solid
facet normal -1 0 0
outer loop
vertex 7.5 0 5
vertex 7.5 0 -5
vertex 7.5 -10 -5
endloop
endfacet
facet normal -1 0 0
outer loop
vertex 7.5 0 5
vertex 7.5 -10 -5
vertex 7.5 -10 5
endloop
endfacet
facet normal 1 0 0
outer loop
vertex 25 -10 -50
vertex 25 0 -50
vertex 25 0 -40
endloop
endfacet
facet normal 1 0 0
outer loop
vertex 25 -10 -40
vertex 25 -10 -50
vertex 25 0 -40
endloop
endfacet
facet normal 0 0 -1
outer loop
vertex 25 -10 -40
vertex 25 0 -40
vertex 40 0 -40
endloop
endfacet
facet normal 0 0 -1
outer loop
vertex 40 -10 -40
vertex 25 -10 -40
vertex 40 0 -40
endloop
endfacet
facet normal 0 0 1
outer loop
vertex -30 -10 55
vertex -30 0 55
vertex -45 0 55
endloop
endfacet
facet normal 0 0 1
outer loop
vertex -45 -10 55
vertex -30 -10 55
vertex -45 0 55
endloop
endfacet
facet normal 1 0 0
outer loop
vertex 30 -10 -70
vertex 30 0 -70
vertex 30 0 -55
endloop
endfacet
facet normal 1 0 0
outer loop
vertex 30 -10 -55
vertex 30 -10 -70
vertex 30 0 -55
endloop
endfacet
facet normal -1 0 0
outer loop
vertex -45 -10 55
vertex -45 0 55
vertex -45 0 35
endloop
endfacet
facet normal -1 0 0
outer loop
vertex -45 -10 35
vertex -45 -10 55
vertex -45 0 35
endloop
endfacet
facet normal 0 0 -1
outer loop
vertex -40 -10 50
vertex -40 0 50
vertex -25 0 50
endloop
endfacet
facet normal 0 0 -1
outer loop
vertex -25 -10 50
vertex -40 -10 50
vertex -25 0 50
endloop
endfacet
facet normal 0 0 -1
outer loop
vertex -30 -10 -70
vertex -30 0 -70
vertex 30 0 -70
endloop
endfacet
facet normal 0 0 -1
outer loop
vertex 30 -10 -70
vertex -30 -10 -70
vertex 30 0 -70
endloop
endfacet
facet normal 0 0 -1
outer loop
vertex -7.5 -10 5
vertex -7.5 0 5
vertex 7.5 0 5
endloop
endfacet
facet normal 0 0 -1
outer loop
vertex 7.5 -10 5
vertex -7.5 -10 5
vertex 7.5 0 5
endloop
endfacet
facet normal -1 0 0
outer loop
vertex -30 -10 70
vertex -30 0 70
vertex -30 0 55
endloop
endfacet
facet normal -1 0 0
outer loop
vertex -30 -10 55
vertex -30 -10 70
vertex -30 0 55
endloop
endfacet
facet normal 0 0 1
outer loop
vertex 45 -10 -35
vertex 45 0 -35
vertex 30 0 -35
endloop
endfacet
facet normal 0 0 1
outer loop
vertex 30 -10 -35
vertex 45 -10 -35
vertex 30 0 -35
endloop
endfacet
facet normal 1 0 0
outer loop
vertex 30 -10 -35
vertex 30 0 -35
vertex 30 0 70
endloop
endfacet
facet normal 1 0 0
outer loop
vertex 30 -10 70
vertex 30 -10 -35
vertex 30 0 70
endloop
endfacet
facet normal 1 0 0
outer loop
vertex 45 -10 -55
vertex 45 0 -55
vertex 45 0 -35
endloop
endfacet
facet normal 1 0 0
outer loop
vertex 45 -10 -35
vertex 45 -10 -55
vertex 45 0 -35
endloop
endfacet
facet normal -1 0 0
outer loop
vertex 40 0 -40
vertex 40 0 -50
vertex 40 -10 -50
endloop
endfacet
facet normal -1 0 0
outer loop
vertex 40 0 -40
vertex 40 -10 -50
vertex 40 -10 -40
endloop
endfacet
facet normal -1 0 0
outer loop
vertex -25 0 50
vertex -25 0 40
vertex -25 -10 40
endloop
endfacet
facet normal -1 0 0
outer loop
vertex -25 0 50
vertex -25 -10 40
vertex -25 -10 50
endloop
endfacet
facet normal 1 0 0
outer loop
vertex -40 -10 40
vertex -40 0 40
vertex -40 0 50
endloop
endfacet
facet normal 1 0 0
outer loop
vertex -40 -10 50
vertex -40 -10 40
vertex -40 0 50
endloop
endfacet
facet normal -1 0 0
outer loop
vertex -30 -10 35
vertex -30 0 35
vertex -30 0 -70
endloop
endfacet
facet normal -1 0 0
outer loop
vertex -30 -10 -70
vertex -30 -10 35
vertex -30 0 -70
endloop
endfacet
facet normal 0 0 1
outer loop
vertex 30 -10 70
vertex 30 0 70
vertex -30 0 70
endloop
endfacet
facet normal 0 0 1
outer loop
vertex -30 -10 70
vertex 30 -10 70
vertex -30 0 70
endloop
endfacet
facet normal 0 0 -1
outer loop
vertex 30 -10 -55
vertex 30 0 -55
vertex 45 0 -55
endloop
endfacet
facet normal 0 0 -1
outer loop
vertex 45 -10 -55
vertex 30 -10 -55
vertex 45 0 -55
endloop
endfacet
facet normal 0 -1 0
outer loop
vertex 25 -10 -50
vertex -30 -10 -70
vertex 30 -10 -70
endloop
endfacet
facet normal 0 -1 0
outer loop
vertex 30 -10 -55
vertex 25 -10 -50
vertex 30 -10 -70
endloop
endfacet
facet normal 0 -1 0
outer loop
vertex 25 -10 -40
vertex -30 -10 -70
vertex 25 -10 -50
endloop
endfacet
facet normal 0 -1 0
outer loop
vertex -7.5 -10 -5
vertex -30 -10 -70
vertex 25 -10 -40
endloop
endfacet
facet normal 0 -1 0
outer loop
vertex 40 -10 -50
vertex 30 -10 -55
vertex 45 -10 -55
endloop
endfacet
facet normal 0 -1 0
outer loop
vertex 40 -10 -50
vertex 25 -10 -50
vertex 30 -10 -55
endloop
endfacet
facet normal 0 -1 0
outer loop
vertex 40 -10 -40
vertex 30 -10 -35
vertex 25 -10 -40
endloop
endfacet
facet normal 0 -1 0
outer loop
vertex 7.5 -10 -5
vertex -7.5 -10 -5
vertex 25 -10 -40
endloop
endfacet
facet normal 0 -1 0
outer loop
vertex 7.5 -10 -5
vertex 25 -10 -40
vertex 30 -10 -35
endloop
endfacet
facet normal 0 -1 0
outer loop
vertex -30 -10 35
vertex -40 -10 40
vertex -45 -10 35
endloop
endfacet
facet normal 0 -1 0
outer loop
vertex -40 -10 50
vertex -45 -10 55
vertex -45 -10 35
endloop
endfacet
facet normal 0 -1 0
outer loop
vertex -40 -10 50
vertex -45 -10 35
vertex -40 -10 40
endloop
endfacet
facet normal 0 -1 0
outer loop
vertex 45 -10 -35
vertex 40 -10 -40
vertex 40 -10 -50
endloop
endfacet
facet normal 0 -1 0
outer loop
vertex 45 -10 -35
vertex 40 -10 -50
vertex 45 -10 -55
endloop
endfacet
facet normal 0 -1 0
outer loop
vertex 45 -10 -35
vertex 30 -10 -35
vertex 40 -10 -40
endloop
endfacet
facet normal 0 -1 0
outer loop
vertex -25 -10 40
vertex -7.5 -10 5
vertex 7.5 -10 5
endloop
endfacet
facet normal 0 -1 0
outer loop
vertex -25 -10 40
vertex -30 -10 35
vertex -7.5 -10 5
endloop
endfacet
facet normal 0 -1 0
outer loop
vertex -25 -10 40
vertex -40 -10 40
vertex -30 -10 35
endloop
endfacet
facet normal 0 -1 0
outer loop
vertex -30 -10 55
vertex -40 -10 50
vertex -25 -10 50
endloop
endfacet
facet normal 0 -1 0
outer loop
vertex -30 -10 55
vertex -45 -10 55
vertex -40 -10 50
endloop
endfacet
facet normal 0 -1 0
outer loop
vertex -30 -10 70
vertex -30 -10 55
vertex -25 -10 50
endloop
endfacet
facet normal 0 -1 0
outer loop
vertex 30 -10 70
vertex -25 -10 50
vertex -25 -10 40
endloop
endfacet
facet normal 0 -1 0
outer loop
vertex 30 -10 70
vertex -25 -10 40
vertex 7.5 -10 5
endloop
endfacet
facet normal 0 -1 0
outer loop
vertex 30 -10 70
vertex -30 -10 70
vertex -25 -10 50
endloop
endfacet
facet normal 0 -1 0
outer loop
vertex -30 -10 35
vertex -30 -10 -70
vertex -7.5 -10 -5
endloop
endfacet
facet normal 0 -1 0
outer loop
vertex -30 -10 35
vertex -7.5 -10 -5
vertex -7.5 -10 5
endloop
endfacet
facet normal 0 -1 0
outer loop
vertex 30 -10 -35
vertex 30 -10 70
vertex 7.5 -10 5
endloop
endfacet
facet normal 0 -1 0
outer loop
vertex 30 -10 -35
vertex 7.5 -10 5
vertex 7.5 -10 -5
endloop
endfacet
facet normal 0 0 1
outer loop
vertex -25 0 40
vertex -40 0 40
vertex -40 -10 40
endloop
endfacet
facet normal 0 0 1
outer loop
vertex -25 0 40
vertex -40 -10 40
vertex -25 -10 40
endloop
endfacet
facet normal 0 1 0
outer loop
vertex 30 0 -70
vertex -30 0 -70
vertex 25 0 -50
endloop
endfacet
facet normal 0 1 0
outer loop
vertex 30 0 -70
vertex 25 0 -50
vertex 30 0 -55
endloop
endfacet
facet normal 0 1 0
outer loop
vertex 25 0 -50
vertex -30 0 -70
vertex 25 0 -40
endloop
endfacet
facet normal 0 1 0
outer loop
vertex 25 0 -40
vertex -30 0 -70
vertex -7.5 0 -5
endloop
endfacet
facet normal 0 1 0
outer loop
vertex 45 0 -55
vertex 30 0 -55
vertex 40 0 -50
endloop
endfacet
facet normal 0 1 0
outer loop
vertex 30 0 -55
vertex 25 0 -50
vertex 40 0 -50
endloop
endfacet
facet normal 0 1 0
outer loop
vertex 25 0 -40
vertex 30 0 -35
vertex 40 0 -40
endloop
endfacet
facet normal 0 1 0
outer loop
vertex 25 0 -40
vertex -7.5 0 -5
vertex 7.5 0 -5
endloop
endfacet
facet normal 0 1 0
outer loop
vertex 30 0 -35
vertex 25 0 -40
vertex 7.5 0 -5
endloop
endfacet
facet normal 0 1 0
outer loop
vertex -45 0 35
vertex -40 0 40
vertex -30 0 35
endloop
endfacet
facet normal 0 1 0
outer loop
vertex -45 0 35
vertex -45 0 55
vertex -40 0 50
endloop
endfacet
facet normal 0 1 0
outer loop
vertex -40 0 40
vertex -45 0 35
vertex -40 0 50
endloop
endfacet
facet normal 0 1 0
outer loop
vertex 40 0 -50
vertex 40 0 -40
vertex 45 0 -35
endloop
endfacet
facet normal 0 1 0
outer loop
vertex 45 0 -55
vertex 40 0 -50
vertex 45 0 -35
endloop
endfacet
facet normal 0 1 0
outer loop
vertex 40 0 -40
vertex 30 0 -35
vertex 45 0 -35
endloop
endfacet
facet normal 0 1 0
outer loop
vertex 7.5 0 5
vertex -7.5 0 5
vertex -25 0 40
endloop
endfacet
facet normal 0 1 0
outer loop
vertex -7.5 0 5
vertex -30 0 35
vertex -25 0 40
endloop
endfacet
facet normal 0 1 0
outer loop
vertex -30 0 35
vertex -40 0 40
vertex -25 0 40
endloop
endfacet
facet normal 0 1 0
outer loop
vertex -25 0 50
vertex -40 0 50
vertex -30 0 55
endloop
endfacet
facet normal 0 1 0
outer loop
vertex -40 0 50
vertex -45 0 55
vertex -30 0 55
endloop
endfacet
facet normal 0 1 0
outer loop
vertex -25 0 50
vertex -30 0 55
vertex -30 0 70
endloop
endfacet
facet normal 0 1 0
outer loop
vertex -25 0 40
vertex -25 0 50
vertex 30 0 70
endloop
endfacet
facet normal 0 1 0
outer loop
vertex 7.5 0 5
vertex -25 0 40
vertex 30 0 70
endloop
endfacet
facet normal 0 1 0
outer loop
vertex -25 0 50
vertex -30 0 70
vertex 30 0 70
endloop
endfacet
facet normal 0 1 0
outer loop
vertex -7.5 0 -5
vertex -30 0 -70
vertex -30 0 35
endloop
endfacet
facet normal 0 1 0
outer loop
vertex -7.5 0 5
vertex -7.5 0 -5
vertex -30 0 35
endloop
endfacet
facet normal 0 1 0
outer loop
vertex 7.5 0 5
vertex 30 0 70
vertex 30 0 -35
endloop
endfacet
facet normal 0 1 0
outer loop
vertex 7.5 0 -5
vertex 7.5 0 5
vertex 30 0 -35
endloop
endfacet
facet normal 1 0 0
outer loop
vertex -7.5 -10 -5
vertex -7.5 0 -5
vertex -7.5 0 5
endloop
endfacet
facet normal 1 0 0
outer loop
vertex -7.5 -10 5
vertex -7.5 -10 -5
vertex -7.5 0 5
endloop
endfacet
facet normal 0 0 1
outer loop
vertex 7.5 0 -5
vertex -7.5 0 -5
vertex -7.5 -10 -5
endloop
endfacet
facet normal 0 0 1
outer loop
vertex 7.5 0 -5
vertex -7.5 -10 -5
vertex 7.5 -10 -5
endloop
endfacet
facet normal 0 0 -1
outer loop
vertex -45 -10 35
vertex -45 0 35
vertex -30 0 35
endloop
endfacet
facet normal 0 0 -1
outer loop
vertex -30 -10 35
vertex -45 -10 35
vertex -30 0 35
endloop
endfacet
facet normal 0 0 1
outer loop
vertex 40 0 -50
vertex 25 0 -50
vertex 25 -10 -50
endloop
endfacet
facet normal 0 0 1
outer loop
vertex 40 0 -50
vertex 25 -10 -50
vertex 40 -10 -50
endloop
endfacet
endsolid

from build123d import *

# Parameters (mm, degrees)
F0_W     = 15
F0_H     = 10
F1_DEPTH = 10


with BuildPart() as f1:
    # F0 (on Front) → F1 (new body)
    with BuildSketch(Plane.XZ):
        Polygon((30, 70), (-30, 70), (-30, 55), (-45, 55), (-45, 35), (-30, 35), (-30, -70), (30, -70), (30, -55), (45, -55), (45, -35), (30, -35), align=None)
        with Locations((32.5, -45)):
            Rectangle(F0_W, F0_H, mode=Mode.SUBTRACT)
        with Locations((-32.5, 45)):
            Rectangle(F0_W, F0_H, mode=Mode.SUBTRACT)
        Rectangle(F0_W, F0_H, mode=Mode.SUBTRACT)
    extrude(amount=F1_DEPTH)


solid = f1.part
